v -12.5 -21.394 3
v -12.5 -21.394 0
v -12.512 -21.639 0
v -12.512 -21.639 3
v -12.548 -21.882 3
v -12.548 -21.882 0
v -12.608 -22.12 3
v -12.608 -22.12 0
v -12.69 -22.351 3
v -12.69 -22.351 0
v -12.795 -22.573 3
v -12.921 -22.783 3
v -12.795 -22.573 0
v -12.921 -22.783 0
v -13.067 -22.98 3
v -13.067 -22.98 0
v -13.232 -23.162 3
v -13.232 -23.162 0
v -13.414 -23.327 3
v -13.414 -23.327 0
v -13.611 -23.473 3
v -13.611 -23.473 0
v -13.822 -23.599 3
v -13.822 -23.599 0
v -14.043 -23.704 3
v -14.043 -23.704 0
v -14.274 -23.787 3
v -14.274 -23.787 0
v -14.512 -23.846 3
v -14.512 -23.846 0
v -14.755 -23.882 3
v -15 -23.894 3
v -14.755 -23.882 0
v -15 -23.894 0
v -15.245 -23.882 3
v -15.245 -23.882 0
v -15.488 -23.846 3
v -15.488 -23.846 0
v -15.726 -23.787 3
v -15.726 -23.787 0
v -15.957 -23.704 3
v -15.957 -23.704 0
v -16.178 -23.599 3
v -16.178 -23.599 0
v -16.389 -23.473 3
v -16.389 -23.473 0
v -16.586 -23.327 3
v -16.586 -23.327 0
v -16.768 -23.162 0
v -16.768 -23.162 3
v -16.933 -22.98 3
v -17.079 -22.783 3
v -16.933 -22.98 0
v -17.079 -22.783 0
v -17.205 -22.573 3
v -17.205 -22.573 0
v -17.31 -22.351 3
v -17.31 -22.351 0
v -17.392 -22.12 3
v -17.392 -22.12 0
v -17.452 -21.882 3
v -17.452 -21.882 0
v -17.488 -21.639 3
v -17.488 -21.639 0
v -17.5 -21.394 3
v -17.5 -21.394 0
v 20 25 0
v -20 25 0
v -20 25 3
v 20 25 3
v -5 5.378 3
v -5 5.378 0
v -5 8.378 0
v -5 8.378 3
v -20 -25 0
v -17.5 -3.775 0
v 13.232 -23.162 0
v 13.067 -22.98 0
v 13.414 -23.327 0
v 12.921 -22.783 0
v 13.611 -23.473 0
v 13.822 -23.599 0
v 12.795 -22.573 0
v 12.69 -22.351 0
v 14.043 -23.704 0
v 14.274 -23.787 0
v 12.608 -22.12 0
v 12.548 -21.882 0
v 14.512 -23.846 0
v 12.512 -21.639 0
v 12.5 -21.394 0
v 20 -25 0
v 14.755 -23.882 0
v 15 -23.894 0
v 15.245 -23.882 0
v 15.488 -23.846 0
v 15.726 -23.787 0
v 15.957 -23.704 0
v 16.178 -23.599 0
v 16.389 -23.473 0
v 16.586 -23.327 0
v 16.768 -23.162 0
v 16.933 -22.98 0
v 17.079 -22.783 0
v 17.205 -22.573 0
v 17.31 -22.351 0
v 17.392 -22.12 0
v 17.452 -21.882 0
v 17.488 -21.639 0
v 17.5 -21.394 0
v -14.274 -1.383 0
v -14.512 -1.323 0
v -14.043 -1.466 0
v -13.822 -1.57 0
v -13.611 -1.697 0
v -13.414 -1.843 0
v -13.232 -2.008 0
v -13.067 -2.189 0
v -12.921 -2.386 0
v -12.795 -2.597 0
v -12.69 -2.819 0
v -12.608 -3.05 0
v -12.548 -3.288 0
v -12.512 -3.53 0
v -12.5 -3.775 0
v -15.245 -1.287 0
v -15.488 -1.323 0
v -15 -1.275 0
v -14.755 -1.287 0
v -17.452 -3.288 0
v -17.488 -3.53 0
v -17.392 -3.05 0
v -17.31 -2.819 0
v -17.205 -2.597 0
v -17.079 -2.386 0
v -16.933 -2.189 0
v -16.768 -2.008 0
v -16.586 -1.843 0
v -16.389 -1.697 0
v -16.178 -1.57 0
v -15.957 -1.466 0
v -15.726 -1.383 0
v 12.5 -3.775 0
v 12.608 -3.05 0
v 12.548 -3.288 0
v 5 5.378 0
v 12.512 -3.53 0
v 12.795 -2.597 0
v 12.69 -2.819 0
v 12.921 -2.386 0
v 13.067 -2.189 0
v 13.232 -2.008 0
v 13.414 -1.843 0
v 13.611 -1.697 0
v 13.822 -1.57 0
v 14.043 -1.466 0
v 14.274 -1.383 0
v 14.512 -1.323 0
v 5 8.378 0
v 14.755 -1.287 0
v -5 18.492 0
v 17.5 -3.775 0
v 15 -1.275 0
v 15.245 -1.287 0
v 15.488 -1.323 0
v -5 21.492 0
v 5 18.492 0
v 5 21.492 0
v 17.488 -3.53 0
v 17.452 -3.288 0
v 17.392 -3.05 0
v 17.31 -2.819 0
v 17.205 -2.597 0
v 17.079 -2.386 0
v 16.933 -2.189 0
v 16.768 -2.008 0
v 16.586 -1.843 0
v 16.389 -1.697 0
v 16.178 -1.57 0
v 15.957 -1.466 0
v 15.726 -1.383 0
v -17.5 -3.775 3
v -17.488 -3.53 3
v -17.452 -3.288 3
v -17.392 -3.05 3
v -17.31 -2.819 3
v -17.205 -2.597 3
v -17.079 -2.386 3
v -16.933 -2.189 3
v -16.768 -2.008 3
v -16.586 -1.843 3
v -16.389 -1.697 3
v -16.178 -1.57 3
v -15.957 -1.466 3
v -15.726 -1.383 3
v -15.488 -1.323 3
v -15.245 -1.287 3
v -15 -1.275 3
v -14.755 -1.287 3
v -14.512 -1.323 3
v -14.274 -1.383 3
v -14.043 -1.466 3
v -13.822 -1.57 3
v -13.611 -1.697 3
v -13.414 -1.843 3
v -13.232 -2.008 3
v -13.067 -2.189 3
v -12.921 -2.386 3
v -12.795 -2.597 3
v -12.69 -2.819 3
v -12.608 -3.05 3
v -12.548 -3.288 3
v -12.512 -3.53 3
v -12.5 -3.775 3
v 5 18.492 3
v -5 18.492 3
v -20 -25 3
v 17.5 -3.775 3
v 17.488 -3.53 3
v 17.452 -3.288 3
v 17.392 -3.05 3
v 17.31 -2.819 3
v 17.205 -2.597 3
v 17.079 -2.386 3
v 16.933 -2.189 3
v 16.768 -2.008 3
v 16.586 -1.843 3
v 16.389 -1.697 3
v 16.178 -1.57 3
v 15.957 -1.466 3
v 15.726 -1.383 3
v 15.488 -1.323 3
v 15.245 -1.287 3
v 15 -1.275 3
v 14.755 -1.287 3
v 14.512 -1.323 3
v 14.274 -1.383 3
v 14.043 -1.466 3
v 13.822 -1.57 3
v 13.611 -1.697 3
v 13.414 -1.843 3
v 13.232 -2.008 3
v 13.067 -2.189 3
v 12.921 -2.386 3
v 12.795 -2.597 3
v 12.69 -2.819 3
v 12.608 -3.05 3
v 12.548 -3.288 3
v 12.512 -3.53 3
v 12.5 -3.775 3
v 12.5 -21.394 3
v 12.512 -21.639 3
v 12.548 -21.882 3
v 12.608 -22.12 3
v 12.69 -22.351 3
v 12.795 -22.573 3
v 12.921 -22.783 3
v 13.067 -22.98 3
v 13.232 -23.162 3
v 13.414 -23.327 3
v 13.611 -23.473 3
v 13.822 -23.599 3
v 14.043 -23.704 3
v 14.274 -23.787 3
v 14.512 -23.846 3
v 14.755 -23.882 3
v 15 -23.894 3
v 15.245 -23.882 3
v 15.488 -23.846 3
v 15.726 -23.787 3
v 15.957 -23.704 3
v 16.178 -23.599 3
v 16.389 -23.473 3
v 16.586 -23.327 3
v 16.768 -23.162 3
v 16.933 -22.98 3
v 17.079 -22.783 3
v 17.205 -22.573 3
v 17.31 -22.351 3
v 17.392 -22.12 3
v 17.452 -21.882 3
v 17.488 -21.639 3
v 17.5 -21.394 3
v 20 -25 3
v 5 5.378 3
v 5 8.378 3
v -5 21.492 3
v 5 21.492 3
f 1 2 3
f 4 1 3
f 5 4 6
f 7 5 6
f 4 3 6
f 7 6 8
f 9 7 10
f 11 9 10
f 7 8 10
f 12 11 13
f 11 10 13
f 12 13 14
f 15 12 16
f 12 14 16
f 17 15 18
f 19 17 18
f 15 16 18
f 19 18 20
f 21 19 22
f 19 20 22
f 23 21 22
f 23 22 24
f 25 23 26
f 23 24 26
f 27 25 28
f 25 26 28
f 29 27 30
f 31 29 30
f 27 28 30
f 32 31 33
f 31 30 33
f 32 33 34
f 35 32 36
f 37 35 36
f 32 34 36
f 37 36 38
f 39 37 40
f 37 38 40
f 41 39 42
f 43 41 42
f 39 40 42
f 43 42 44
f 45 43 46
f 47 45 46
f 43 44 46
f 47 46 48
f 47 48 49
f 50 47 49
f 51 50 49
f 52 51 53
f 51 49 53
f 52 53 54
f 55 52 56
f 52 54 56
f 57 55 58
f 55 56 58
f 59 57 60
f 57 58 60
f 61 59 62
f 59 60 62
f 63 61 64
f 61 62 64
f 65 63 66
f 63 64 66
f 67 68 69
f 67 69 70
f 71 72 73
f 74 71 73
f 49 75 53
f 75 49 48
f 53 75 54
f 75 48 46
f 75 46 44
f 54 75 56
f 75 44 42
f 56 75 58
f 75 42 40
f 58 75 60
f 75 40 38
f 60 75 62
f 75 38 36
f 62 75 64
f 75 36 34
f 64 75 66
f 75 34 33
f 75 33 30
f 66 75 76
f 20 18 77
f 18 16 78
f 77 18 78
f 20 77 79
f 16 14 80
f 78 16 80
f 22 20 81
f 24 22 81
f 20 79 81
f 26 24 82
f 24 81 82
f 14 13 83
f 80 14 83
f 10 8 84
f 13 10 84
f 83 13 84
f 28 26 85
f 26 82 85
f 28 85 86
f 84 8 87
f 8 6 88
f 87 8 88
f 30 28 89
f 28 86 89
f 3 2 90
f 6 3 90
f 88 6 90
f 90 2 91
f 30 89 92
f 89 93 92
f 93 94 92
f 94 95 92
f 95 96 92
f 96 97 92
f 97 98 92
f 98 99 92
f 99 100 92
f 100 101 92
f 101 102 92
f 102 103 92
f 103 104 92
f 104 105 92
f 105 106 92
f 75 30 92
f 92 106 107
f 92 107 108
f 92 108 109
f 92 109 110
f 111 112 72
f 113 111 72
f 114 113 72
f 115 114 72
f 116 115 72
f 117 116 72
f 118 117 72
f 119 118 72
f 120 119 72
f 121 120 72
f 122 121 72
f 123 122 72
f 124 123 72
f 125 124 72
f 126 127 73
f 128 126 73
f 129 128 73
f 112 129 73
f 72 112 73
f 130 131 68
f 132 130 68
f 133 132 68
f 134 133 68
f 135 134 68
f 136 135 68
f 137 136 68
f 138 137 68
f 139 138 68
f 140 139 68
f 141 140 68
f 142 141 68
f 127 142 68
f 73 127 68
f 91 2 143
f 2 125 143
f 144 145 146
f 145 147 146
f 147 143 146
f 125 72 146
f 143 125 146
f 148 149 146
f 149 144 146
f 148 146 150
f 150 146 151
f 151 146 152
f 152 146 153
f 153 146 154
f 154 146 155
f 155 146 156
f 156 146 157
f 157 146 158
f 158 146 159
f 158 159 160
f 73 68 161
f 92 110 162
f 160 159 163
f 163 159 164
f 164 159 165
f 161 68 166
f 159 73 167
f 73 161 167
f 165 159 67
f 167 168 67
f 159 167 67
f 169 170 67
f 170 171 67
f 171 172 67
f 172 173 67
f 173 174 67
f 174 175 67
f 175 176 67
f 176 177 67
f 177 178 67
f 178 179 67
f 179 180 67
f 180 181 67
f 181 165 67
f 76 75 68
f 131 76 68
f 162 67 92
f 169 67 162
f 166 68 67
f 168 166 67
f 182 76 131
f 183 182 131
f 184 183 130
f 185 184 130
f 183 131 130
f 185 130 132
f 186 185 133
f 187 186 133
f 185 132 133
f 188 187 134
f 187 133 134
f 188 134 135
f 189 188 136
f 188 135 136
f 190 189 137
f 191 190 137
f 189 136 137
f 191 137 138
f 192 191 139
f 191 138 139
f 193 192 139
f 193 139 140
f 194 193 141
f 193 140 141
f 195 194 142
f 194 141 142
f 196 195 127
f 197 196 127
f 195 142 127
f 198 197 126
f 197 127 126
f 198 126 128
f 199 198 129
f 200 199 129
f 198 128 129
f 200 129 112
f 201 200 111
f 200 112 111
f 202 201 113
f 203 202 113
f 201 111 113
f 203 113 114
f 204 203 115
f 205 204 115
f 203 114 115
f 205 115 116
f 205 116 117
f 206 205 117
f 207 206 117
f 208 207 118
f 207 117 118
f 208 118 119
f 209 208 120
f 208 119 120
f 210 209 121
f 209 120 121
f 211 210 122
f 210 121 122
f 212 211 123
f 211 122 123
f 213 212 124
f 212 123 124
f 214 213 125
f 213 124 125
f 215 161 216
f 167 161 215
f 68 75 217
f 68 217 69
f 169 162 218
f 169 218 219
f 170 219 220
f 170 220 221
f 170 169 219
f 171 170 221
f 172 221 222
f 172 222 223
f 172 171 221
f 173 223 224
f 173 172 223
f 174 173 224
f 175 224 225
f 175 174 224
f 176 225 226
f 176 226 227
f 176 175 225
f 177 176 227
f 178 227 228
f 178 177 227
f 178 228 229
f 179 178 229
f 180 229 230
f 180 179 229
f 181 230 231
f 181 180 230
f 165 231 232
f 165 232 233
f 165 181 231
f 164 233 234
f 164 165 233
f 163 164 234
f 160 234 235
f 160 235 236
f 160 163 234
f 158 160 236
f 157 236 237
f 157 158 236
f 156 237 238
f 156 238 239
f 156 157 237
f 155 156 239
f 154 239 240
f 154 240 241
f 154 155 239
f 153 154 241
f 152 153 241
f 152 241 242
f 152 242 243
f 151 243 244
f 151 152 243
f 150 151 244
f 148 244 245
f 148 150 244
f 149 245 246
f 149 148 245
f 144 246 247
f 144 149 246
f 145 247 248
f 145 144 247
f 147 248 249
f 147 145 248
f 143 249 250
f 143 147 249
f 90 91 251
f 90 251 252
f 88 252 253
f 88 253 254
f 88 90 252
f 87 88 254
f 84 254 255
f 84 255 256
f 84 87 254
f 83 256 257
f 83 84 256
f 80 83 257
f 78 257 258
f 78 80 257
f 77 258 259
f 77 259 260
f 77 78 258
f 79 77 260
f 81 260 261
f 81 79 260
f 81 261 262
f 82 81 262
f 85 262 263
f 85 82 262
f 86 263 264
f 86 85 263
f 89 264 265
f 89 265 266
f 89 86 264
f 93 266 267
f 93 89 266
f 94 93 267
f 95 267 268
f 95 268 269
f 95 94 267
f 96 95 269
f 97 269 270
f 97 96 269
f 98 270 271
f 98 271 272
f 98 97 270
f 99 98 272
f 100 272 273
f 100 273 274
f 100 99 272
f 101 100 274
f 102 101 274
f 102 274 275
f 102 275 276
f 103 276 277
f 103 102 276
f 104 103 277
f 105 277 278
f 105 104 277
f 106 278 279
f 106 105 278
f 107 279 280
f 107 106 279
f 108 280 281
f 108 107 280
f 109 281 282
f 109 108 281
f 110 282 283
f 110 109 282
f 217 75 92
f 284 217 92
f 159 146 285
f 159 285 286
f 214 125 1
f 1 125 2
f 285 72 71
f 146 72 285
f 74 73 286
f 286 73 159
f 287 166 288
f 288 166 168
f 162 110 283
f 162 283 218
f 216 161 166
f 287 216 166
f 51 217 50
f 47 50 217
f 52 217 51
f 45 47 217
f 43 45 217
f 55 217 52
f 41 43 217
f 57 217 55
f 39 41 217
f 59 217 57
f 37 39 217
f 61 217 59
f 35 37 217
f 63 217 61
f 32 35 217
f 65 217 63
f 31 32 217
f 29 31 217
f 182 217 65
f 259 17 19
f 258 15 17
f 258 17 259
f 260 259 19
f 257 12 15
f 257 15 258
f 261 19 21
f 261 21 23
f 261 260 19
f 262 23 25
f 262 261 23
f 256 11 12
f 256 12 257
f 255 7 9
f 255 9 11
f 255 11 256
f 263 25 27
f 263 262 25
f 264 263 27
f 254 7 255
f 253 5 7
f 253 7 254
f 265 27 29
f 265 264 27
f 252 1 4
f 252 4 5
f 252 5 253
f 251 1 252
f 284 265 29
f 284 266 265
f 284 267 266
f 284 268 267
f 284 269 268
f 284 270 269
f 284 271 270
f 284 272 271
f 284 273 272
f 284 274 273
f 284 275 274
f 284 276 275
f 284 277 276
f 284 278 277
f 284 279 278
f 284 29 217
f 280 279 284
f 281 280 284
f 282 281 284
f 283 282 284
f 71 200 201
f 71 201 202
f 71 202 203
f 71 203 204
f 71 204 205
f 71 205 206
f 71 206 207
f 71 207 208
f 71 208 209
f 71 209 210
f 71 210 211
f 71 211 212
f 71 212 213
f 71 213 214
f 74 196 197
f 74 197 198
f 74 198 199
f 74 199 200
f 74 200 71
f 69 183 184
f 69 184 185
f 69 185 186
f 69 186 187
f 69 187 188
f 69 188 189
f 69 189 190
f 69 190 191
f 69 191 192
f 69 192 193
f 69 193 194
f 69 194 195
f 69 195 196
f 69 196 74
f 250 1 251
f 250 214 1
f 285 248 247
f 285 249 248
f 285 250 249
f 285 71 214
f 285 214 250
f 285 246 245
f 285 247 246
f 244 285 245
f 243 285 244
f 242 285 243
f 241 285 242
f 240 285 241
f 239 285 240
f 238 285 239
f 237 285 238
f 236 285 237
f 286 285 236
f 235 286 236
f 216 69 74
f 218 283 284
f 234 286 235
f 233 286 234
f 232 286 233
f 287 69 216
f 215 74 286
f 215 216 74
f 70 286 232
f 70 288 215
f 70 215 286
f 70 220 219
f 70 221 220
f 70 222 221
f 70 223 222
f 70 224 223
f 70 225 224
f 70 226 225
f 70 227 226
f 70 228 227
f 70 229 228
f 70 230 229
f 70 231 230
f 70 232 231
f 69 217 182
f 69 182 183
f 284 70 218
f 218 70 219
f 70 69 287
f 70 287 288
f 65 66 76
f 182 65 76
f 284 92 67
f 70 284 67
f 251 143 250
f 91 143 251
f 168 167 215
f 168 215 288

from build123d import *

# Parameters (mm, degrees)
SKETCH1_W           = 40
SKETCH1_H           = 50
SKETCH1_W_2         = 10
SKETCH1_H_2         = 3
BOSS_EXTRUDE1_DEPTH = 3


with BuildPart() as part:
    # Sketch1 → Boss-Extrude1 (new body)
    with BuildSketch(Plane.XY):
        Rectangle(SKETCH1_W, SKETCH1_H)
        with Locations((0, 19.992227475)):
            Rectangle(SKETCH1_W_2, SKETCH1_H_2, mode=Mode.SUBTRACT)
        with Locations((0, 6.878051322)):
            Rectangle(SKETCH1_W_2, SKETCH1_H_2, mode=Mode.SUBTRACT)
        with BuildLine():
            Line((-12.5, -3.7753024), (-12.5, -21.394229107))
            ThreePointArc((-12.5, -21.394229107), (-15, -23.894229107), (-17.5, -21.394229107))
            Line((-17.5, -21.394229107), (-17.5, -3.7753024))
            ThreePointArc((-17.5, -3.7753024), (-15, -1.2753024), (-12.5, -3.7753024))
        make_face(mode=Mode.SUBTRACT)
        with BuildLine():
            Line((12.5, -3.7753024), (12.5, -21.394229107))
            ThreePointArc((12.5, -21.394229107), (15, -23.894229107), (17.5, -21.394229107))
            Line((17.5, -21.394229107), (17.5, -3.7753024))
            ThreePointArc((17.5, -3.7753024), (15, -1.2753024), (12.5, -3.7753024))
        make_face(mode=Mode.SUBTRACT)
    extrude(amount=BOSS_EXTRUDE1_DEPTH)


solid = part.part
